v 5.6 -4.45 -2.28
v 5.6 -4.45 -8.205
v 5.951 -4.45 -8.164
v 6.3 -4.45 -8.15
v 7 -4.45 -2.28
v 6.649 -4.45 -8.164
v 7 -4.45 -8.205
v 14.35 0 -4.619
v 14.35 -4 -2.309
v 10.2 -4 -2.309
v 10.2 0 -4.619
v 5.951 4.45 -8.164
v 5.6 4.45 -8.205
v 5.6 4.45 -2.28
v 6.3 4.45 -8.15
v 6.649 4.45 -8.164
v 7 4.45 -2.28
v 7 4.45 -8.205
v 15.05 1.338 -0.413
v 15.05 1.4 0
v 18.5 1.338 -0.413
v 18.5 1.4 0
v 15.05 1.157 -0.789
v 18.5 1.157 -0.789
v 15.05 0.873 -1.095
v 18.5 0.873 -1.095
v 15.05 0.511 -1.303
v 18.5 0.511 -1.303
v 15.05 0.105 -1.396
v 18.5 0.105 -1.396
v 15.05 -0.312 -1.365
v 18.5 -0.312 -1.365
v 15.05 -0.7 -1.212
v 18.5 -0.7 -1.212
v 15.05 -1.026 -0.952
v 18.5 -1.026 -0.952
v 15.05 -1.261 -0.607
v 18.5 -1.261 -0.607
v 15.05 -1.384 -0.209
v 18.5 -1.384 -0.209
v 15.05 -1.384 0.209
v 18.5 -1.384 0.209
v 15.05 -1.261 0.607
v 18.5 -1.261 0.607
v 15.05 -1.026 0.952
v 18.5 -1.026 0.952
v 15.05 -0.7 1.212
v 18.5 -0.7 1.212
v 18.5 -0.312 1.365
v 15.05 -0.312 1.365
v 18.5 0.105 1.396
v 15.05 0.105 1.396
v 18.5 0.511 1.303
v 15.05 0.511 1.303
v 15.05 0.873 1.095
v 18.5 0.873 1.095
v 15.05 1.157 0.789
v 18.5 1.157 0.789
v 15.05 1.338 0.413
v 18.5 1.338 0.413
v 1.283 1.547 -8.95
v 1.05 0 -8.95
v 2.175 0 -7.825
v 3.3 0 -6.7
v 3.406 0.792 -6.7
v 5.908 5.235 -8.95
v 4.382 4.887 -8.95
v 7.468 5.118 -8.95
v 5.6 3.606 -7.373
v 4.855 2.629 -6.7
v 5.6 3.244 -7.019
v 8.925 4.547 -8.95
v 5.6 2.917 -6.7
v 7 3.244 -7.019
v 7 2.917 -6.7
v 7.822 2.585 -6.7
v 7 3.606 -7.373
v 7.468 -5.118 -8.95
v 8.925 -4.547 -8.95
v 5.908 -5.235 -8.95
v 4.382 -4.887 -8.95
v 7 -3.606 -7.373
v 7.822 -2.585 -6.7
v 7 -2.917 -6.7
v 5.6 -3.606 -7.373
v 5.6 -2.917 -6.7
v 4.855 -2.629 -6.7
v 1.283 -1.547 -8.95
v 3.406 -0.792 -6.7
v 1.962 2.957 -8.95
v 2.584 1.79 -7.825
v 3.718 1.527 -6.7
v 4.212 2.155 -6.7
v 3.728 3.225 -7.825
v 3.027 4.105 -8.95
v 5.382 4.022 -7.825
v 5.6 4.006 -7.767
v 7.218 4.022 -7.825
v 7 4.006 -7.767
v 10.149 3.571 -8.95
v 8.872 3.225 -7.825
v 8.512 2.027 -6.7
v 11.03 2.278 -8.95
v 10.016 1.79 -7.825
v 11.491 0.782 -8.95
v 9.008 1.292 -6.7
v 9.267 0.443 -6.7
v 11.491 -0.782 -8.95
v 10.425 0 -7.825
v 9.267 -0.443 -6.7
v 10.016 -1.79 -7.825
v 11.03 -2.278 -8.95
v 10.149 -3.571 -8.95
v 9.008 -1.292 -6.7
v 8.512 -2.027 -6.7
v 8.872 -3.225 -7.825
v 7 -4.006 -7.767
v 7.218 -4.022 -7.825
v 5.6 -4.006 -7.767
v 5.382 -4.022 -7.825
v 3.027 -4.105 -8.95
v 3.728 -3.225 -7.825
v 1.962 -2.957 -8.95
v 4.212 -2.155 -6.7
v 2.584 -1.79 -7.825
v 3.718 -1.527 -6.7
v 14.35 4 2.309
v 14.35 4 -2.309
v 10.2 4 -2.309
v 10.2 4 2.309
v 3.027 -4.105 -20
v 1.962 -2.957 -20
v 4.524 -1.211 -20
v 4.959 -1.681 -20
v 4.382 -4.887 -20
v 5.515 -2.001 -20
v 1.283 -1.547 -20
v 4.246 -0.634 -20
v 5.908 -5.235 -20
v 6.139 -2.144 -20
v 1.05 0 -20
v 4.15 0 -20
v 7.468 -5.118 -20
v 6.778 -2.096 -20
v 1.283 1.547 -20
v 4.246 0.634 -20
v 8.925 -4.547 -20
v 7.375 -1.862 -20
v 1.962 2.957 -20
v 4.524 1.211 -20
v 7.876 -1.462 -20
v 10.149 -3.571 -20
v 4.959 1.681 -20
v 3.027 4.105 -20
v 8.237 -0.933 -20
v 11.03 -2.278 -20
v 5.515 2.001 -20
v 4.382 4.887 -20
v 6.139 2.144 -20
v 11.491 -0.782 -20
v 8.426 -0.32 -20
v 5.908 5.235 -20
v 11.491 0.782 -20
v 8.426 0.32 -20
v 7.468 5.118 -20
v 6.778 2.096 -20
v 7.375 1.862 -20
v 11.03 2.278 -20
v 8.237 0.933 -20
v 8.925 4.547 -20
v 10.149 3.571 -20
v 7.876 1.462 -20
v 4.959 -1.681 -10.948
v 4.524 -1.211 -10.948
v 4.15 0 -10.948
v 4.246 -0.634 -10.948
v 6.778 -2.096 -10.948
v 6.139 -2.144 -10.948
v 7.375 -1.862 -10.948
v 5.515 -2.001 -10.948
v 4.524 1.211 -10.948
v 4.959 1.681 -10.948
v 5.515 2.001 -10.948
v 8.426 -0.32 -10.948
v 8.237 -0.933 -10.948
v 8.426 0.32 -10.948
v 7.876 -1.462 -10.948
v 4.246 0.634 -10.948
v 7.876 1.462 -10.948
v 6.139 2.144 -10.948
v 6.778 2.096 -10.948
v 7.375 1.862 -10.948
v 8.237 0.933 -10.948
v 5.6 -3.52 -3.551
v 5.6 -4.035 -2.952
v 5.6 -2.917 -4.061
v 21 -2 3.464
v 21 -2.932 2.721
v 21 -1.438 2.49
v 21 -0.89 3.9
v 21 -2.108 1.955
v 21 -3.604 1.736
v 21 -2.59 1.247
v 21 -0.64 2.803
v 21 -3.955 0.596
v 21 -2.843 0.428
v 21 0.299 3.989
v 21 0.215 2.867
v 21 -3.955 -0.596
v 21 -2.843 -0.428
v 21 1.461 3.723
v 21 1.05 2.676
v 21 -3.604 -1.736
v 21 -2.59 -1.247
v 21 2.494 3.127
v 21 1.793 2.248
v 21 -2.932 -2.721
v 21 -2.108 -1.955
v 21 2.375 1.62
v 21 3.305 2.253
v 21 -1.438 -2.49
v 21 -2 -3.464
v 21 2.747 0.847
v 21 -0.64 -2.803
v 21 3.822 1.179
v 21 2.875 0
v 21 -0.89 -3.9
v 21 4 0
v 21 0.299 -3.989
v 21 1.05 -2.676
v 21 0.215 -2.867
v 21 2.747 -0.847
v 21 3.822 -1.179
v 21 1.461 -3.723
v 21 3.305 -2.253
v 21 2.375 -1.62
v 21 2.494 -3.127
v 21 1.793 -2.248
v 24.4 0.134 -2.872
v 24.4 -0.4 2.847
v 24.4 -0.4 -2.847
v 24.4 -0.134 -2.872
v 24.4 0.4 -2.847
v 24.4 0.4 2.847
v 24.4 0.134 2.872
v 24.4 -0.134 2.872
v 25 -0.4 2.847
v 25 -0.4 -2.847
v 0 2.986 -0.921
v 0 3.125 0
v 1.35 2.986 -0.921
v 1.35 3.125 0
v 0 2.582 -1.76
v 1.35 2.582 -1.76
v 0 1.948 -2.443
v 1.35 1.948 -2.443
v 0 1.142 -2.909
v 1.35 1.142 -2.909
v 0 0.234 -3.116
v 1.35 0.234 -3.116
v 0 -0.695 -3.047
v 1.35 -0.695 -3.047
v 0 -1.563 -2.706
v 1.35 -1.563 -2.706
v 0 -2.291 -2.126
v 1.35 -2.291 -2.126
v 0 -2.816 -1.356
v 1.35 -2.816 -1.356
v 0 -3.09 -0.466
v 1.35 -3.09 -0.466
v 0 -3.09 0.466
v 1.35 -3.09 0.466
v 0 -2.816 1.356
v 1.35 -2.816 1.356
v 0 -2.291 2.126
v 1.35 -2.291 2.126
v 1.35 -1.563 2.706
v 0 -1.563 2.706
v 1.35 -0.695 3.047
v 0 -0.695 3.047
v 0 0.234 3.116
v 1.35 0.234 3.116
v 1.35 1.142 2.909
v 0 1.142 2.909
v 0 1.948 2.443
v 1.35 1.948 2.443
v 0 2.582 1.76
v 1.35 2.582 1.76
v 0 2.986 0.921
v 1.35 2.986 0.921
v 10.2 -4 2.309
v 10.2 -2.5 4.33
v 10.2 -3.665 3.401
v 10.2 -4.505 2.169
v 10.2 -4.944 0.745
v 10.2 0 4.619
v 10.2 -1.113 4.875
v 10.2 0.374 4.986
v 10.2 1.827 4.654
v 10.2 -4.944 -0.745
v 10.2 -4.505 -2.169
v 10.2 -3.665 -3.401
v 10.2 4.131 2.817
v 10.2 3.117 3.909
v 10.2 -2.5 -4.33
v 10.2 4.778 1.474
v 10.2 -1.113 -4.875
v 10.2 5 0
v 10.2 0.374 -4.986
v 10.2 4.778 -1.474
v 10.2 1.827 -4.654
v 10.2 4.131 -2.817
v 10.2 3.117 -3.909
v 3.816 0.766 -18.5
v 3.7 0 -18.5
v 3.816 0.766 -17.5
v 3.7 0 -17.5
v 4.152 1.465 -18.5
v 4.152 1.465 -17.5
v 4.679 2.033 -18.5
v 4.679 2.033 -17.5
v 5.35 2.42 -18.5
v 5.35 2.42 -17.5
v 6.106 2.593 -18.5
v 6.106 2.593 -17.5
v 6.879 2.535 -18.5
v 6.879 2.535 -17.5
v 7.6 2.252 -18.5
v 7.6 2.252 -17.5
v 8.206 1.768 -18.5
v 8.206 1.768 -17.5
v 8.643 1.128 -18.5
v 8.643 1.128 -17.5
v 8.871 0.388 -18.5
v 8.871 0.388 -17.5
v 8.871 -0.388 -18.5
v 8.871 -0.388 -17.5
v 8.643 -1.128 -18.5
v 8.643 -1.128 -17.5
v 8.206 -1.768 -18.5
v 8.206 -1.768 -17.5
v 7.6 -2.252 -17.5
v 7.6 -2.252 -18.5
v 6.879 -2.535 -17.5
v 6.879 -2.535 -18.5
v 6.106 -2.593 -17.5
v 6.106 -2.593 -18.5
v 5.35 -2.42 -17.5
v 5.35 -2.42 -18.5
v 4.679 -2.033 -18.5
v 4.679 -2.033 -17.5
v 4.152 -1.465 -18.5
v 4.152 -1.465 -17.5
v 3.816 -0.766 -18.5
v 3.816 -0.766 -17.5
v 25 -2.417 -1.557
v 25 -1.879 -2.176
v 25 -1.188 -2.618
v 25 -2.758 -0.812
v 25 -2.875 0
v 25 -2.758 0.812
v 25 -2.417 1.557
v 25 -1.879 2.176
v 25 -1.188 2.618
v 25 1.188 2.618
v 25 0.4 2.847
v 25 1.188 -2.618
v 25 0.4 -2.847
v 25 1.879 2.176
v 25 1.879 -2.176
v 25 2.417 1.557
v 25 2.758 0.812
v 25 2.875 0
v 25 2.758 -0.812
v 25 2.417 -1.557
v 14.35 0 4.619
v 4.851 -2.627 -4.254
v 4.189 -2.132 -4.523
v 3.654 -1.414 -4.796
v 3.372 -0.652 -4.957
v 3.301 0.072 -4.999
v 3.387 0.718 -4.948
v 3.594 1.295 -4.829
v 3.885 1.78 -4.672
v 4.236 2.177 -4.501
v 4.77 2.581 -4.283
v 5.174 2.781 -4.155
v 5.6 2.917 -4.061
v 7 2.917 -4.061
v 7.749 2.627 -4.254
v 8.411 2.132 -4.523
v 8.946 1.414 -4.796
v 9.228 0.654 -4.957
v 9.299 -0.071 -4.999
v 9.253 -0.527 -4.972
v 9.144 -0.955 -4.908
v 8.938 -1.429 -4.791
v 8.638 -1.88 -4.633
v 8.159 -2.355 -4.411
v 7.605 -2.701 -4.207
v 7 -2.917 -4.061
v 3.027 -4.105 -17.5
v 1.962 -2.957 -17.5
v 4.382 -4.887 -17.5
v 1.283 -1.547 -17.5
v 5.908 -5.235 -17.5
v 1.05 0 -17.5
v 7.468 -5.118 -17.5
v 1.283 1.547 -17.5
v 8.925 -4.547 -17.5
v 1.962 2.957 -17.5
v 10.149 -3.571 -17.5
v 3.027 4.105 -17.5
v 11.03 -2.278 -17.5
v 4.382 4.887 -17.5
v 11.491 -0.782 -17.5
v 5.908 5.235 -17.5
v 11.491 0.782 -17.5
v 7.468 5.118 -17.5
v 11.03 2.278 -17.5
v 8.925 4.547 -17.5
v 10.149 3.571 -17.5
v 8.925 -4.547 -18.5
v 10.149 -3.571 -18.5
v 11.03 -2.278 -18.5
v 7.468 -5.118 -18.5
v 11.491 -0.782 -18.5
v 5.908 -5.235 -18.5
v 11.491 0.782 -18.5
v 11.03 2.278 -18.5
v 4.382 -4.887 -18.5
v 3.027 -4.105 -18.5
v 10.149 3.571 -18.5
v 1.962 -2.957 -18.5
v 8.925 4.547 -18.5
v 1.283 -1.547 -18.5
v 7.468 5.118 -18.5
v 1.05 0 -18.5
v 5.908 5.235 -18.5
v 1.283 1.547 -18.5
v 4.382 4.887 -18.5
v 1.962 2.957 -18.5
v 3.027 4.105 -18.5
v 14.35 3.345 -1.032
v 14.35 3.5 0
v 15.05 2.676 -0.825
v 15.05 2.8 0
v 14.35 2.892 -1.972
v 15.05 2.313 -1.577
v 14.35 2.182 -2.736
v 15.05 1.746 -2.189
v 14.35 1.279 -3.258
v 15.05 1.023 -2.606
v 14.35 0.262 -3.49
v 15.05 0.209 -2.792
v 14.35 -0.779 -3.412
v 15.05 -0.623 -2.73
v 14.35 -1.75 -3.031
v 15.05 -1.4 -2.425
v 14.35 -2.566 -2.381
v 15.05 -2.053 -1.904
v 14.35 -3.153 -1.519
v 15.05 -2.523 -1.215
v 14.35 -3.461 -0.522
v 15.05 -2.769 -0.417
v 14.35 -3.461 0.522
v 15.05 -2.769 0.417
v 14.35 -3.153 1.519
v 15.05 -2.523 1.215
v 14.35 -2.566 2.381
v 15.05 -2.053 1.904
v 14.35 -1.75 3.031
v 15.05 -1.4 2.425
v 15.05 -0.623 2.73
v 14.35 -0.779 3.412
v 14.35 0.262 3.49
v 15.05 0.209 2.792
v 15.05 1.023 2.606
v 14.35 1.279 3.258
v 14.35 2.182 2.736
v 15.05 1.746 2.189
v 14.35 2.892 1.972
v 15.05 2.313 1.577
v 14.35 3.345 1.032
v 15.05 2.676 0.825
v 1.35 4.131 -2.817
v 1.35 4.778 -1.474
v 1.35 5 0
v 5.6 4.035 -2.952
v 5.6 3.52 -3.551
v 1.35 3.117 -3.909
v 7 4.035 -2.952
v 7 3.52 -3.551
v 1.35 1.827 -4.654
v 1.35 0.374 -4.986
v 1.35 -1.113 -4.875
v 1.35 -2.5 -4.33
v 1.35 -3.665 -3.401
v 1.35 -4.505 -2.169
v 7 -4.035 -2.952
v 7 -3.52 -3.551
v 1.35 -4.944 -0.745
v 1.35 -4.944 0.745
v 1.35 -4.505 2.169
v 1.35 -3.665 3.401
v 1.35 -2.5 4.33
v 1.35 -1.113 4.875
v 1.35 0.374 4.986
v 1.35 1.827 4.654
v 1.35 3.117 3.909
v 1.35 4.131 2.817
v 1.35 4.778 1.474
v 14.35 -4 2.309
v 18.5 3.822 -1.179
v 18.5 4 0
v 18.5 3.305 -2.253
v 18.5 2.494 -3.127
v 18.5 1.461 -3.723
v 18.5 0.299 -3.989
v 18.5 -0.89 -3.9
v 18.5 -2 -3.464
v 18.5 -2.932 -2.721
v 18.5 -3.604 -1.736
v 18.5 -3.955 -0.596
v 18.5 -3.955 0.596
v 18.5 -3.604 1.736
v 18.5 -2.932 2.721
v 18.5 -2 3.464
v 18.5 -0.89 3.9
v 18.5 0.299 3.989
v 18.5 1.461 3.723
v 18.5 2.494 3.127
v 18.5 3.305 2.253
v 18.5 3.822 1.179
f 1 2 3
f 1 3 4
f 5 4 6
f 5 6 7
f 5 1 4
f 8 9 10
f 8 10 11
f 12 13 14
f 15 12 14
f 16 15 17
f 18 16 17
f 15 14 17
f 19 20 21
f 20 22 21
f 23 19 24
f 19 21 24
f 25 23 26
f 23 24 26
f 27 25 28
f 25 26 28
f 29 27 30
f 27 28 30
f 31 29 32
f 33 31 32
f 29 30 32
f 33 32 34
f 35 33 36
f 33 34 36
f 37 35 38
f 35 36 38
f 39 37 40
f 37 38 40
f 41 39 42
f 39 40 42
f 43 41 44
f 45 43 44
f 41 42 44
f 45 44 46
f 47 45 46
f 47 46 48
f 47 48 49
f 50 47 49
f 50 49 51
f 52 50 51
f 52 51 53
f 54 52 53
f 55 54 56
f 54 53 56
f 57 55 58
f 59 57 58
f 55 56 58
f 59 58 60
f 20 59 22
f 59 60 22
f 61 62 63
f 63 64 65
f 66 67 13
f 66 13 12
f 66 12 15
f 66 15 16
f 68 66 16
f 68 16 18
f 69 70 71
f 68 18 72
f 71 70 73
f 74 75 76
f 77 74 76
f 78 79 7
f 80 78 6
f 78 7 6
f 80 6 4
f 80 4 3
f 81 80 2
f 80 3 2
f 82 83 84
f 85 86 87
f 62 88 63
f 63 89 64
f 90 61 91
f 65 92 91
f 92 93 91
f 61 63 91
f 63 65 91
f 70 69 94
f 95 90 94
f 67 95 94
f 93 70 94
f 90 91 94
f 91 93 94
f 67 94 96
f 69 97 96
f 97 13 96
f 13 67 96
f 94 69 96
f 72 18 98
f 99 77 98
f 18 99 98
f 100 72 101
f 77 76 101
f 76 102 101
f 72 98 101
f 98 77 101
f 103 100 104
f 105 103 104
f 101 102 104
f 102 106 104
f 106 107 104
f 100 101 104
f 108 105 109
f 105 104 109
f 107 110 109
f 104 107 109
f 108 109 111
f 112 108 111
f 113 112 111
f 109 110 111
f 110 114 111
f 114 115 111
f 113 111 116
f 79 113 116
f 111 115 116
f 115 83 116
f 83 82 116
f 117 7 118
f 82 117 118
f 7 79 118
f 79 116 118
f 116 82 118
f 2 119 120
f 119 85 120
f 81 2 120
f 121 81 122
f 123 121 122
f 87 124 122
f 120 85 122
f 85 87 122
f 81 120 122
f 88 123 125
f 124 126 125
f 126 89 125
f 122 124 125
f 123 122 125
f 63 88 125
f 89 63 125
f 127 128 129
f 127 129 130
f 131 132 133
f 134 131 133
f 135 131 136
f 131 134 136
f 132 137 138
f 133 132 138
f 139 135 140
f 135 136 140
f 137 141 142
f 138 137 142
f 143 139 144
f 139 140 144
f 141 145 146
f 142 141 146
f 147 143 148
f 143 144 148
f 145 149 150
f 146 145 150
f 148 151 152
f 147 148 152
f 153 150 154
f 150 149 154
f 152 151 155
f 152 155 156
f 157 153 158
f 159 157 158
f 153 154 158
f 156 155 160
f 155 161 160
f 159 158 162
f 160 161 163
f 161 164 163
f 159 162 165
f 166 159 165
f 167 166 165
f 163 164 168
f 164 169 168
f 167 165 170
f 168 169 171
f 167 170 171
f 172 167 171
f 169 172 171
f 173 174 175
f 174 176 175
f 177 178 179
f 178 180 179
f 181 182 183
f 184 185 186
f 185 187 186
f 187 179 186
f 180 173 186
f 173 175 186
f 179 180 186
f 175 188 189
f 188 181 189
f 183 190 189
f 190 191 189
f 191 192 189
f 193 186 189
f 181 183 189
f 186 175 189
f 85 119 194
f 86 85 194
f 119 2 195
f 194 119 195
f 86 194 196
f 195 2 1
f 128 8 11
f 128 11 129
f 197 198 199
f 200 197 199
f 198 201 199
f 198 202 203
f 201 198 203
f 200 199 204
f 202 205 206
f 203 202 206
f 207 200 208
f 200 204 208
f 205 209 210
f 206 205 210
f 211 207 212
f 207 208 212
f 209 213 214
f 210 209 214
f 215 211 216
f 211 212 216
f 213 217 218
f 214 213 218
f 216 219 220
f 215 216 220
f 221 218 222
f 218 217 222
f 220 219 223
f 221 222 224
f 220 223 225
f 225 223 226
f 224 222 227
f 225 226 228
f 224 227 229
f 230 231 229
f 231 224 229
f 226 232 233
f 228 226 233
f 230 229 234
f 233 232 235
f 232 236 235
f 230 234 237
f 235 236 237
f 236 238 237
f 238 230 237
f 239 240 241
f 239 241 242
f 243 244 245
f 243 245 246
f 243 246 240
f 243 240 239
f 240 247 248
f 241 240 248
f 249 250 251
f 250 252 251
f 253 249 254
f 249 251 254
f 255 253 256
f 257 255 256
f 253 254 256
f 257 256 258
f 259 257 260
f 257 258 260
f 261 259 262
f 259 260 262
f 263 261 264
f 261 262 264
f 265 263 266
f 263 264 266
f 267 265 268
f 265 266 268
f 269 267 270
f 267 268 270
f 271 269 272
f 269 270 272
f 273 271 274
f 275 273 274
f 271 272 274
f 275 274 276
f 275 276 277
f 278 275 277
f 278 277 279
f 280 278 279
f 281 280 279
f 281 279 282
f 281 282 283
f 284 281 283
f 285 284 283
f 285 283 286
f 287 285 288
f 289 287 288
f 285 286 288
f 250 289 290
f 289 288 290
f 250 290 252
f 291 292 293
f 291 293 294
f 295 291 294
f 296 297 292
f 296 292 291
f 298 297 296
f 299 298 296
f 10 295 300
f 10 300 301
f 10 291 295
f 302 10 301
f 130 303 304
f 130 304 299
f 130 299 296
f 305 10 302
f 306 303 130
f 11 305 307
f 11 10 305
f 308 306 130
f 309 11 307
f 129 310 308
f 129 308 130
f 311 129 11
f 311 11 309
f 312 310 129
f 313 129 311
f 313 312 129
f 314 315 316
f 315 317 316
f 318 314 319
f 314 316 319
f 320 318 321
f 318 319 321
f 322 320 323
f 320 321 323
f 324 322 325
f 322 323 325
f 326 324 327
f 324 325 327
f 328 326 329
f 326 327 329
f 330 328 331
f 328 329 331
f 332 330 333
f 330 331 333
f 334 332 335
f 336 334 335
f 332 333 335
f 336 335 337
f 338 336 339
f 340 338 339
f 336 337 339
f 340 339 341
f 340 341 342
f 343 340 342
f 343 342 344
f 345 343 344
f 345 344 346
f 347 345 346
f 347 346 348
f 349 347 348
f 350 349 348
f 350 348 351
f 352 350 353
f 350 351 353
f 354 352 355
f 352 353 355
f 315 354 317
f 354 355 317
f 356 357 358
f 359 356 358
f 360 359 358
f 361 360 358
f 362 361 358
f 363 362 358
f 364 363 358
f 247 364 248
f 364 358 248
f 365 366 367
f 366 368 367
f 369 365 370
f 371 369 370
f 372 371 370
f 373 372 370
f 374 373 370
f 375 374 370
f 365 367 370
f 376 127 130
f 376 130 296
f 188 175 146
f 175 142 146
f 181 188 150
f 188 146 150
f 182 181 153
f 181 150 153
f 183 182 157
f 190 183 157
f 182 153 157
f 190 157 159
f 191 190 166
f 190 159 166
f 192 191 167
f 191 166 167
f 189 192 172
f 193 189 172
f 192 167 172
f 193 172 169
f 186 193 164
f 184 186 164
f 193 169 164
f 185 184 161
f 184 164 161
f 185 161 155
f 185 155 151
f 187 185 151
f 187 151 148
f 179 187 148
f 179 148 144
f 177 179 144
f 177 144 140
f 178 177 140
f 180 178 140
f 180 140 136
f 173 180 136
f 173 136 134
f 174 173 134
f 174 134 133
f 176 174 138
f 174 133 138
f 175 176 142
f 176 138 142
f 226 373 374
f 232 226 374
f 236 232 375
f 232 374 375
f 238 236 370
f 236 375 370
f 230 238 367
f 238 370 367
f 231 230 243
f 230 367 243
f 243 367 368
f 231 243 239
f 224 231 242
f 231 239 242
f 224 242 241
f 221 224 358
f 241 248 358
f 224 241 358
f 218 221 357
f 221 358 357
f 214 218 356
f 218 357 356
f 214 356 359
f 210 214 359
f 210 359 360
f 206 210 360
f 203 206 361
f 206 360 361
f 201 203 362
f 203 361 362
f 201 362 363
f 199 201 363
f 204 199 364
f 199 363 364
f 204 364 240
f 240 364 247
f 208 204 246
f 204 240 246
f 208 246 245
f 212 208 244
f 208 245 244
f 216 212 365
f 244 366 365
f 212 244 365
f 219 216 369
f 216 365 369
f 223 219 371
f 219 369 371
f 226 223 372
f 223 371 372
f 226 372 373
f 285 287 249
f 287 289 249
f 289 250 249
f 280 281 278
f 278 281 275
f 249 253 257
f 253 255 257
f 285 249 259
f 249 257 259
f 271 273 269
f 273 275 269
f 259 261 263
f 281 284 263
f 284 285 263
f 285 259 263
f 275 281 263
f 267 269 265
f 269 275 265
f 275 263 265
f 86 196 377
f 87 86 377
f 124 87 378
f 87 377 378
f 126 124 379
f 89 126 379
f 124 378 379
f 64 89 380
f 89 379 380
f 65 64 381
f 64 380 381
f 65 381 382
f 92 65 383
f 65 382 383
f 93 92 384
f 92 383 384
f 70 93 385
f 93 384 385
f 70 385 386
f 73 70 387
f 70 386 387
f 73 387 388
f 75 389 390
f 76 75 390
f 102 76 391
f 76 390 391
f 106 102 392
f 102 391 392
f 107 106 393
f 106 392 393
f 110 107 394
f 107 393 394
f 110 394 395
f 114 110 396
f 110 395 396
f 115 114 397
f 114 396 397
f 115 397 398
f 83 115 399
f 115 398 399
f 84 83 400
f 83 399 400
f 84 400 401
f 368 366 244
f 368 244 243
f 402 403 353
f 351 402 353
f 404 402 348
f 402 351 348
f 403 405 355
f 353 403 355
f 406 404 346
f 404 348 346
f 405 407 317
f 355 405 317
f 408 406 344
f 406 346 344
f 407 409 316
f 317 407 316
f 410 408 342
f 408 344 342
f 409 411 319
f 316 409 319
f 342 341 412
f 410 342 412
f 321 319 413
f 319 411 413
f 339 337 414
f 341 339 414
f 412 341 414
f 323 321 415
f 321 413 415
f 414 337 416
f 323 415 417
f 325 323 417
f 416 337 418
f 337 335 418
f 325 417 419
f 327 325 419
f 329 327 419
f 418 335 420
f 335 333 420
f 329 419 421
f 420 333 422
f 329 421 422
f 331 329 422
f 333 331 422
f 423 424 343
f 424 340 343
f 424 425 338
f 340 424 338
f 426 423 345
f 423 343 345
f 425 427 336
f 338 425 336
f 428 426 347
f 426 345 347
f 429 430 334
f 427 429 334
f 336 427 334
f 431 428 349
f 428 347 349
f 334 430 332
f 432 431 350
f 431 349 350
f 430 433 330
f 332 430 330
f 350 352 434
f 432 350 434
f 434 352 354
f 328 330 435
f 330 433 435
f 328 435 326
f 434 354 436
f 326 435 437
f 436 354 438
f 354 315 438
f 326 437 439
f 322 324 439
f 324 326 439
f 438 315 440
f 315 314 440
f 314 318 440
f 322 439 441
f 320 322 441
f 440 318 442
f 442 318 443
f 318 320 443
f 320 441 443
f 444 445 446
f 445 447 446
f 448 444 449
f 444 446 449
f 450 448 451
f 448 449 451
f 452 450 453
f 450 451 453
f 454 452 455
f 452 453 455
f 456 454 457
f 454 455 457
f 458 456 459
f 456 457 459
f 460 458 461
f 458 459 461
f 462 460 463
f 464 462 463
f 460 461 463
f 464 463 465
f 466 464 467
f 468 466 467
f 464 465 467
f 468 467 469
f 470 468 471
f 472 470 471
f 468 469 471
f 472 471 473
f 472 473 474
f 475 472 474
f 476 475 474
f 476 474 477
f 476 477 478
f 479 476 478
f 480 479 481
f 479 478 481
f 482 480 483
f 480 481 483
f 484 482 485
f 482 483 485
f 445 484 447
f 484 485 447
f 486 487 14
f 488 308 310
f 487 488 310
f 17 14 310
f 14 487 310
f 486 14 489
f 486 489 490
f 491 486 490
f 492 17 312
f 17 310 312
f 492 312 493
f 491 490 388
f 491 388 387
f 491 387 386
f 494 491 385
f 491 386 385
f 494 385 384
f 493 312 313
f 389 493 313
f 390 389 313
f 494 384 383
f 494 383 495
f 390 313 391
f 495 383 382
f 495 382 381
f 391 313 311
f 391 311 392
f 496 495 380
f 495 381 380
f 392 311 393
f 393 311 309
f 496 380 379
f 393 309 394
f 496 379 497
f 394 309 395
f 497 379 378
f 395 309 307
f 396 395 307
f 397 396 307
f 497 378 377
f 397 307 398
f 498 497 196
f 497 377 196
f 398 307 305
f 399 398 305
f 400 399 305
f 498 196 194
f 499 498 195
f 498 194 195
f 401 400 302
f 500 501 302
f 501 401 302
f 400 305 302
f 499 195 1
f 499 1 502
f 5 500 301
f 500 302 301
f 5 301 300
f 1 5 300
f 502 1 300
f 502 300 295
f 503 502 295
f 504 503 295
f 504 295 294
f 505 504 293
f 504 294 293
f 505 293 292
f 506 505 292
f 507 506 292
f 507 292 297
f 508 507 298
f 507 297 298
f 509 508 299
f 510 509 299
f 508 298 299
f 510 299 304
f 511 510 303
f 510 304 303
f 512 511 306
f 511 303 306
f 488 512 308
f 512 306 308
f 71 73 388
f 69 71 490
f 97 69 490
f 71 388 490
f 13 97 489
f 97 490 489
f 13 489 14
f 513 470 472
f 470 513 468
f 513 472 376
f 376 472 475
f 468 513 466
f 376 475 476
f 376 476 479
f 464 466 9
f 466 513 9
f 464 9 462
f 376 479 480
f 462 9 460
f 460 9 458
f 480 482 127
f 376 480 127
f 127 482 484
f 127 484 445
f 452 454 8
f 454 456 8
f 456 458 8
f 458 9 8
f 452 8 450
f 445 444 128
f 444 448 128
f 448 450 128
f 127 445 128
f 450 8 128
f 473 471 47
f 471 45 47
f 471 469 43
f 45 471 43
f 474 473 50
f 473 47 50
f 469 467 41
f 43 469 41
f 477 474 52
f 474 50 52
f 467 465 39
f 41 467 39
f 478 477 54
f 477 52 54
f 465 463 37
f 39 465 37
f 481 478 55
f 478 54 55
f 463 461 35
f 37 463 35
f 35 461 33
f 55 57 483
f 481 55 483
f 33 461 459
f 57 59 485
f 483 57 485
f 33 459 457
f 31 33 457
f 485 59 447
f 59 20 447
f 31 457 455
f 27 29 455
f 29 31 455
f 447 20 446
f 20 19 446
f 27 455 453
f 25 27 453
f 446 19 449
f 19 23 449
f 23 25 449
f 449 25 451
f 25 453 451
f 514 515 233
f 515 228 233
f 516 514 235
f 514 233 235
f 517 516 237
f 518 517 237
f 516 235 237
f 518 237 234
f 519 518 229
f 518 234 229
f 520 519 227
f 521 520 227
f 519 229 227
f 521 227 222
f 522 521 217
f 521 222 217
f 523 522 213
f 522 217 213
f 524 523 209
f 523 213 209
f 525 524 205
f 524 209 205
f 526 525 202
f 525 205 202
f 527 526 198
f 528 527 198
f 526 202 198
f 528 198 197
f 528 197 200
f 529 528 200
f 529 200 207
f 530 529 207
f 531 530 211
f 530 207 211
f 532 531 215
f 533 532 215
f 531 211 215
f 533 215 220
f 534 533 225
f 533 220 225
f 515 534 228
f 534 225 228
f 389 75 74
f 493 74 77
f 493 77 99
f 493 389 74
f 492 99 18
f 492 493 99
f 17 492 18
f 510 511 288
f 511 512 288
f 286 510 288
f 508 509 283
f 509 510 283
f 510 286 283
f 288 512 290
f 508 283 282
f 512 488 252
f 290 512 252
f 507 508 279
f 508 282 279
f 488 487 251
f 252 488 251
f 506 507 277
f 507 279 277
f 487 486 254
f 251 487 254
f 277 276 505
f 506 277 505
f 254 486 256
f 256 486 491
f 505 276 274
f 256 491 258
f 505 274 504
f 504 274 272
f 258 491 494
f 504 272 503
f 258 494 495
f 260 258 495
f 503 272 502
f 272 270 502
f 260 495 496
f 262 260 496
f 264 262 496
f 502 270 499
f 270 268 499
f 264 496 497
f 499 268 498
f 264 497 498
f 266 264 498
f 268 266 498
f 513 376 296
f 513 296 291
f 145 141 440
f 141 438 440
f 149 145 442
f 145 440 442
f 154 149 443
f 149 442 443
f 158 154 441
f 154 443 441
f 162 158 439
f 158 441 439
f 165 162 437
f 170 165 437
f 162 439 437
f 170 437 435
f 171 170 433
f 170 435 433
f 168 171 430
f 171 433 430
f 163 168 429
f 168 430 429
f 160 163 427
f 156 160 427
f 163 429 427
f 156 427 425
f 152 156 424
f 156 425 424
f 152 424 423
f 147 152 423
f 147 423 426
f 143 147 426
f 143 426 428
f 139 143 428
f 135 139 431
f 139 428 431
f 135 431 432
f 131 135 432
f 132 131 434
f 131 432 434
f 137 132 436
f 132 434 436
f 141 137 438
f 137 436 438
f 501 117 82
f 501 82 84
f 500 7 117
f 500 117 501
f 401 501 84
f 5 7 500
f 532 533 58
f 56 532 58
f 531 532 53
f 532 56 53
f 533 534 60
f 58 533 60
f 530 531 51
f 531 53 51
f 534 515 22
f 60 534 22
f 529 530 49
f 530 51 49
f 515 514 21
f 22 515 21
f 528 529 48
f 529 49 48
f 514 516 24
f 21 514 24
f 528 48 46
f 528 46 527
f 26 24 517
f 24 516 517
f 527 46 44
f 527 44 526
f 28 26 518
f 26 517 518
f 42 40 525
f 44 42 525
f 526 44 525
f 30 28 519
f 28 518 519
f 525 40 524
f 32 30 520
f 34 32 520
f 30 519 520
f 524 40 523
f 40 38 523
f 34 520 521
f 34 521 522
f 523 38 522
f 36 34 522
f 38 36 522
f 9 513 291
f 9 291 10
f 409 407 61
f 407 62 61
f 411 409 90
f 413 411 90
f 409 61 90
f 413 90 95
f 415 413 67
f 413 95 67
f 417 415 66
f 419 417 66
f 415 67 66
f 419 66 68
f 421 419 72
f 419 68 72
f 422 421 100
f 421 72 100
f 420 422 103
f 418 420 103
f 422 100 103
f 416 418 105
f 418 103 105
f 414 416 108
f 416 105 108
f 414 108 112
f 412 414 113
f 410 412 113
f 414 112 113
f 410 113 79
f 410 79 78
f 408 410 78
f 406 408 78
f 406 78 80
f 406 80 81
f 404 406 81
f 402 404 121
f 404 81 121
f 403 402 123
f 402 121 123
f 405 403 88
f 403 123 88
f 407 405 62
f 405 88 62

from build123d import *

# Parameters (mm, degrees)
SKETCH2_OUTSIDE_W   = 17.744
SKETCH2_OUTSIDE_H   = 17.744
CUT_EXTRUDE1_DEPTH  = 4.15
SKETCH3_W           = 6.384434702
SKETCH3_H           = 0.8
CUT_EXTRUDE2_DEPTH  = 0.6
SKETCH5_W           = 1.4
SKETCH5_H           = 8.9
BOSS_EXTRUDE1_DEPTH = 10


with BuildPart() as part:
    # Sketch1 → Revolve1 (revolve)
    with BuildSketch(Plane.XY):
        Polygon((0, 0), (0, 3.125), (1.35, 3.125), (1.35, 5), (14.35, 5), (14.35, 3.5), (15.05, 2.8), (15.05, 1.4), (18.5, 1.4), (18.5, 4), (21, 4), (21, 2.875), (25, 2.875), (25, 0), align=None)
    revolve(axis=Axis((25, 0, 0), (-1, 0, 0)))

    # Sketch2 outside → Cut-Extrude1 (cut)
    with BuildSketch(Plane(origin=(14.35, 0, 0), x_dir=(0, 0, -1), z_dir=(1, 0, 0))):
        Rectangle(SKETCH2_OUTSIDE_W, SKETCH2_OUTSIDE_H)
        Polygon((4.618802154, 0), (2.309401077, 4), (-2.309401077, 4), (-4.618802154, 0), (-2.309401077, -4), (2.309401077, -4), align=None, mode=Mode.SUBTRACT)
    extrude(amount=-CUT_EXTRUDE1_DEPTH, mode=Mode.SUBTRACT)

    # Sketch3 → Cut-Extrude2 (cut)
    with BuildSketch(Plane(origin=(25, 0, 0), x_dir=(0, 0, -1), z_dir=(1, 0, 0))):
        Rectangle(SKETCH3_W, SKETCH3_H)
    extrude(amount=-CUT_EXTRUDE2_DEPTH, mode=Mode.SUBTRACT)

    # Sketch4 → Revolve2 (revolve)
    with BuildSketch(Plane(origin=(0, 0, 0), x_dir=(1, 0, 0), z_dir=(0, 1, 0))):
        Polygon((6.3, 0), (6.3, 10.947554121), (4.15, 10.947554121), (4.15, 20), (1.05, 20), (1.05, 18.5), (3.7, 18.5), (3.7, 17.5), (1.05, 17.5), (1.05, 8.95), (3.3, 6.7), (3.3, 0), align=None)
    revolve(axis=Axis((6.3, 0, 0), (0, 0, -1)))

    # Sketch5 → Boss-Extrude1 (add)
    with BuildSketch(Plane.XY):
        with Locations((6.3, 0)):
            Rectangle(SKETCH5_W, SKETCH5_H)
    extrude(amount=-BOSS_EXTRUDE1_DEPTH)


solid = part.part
